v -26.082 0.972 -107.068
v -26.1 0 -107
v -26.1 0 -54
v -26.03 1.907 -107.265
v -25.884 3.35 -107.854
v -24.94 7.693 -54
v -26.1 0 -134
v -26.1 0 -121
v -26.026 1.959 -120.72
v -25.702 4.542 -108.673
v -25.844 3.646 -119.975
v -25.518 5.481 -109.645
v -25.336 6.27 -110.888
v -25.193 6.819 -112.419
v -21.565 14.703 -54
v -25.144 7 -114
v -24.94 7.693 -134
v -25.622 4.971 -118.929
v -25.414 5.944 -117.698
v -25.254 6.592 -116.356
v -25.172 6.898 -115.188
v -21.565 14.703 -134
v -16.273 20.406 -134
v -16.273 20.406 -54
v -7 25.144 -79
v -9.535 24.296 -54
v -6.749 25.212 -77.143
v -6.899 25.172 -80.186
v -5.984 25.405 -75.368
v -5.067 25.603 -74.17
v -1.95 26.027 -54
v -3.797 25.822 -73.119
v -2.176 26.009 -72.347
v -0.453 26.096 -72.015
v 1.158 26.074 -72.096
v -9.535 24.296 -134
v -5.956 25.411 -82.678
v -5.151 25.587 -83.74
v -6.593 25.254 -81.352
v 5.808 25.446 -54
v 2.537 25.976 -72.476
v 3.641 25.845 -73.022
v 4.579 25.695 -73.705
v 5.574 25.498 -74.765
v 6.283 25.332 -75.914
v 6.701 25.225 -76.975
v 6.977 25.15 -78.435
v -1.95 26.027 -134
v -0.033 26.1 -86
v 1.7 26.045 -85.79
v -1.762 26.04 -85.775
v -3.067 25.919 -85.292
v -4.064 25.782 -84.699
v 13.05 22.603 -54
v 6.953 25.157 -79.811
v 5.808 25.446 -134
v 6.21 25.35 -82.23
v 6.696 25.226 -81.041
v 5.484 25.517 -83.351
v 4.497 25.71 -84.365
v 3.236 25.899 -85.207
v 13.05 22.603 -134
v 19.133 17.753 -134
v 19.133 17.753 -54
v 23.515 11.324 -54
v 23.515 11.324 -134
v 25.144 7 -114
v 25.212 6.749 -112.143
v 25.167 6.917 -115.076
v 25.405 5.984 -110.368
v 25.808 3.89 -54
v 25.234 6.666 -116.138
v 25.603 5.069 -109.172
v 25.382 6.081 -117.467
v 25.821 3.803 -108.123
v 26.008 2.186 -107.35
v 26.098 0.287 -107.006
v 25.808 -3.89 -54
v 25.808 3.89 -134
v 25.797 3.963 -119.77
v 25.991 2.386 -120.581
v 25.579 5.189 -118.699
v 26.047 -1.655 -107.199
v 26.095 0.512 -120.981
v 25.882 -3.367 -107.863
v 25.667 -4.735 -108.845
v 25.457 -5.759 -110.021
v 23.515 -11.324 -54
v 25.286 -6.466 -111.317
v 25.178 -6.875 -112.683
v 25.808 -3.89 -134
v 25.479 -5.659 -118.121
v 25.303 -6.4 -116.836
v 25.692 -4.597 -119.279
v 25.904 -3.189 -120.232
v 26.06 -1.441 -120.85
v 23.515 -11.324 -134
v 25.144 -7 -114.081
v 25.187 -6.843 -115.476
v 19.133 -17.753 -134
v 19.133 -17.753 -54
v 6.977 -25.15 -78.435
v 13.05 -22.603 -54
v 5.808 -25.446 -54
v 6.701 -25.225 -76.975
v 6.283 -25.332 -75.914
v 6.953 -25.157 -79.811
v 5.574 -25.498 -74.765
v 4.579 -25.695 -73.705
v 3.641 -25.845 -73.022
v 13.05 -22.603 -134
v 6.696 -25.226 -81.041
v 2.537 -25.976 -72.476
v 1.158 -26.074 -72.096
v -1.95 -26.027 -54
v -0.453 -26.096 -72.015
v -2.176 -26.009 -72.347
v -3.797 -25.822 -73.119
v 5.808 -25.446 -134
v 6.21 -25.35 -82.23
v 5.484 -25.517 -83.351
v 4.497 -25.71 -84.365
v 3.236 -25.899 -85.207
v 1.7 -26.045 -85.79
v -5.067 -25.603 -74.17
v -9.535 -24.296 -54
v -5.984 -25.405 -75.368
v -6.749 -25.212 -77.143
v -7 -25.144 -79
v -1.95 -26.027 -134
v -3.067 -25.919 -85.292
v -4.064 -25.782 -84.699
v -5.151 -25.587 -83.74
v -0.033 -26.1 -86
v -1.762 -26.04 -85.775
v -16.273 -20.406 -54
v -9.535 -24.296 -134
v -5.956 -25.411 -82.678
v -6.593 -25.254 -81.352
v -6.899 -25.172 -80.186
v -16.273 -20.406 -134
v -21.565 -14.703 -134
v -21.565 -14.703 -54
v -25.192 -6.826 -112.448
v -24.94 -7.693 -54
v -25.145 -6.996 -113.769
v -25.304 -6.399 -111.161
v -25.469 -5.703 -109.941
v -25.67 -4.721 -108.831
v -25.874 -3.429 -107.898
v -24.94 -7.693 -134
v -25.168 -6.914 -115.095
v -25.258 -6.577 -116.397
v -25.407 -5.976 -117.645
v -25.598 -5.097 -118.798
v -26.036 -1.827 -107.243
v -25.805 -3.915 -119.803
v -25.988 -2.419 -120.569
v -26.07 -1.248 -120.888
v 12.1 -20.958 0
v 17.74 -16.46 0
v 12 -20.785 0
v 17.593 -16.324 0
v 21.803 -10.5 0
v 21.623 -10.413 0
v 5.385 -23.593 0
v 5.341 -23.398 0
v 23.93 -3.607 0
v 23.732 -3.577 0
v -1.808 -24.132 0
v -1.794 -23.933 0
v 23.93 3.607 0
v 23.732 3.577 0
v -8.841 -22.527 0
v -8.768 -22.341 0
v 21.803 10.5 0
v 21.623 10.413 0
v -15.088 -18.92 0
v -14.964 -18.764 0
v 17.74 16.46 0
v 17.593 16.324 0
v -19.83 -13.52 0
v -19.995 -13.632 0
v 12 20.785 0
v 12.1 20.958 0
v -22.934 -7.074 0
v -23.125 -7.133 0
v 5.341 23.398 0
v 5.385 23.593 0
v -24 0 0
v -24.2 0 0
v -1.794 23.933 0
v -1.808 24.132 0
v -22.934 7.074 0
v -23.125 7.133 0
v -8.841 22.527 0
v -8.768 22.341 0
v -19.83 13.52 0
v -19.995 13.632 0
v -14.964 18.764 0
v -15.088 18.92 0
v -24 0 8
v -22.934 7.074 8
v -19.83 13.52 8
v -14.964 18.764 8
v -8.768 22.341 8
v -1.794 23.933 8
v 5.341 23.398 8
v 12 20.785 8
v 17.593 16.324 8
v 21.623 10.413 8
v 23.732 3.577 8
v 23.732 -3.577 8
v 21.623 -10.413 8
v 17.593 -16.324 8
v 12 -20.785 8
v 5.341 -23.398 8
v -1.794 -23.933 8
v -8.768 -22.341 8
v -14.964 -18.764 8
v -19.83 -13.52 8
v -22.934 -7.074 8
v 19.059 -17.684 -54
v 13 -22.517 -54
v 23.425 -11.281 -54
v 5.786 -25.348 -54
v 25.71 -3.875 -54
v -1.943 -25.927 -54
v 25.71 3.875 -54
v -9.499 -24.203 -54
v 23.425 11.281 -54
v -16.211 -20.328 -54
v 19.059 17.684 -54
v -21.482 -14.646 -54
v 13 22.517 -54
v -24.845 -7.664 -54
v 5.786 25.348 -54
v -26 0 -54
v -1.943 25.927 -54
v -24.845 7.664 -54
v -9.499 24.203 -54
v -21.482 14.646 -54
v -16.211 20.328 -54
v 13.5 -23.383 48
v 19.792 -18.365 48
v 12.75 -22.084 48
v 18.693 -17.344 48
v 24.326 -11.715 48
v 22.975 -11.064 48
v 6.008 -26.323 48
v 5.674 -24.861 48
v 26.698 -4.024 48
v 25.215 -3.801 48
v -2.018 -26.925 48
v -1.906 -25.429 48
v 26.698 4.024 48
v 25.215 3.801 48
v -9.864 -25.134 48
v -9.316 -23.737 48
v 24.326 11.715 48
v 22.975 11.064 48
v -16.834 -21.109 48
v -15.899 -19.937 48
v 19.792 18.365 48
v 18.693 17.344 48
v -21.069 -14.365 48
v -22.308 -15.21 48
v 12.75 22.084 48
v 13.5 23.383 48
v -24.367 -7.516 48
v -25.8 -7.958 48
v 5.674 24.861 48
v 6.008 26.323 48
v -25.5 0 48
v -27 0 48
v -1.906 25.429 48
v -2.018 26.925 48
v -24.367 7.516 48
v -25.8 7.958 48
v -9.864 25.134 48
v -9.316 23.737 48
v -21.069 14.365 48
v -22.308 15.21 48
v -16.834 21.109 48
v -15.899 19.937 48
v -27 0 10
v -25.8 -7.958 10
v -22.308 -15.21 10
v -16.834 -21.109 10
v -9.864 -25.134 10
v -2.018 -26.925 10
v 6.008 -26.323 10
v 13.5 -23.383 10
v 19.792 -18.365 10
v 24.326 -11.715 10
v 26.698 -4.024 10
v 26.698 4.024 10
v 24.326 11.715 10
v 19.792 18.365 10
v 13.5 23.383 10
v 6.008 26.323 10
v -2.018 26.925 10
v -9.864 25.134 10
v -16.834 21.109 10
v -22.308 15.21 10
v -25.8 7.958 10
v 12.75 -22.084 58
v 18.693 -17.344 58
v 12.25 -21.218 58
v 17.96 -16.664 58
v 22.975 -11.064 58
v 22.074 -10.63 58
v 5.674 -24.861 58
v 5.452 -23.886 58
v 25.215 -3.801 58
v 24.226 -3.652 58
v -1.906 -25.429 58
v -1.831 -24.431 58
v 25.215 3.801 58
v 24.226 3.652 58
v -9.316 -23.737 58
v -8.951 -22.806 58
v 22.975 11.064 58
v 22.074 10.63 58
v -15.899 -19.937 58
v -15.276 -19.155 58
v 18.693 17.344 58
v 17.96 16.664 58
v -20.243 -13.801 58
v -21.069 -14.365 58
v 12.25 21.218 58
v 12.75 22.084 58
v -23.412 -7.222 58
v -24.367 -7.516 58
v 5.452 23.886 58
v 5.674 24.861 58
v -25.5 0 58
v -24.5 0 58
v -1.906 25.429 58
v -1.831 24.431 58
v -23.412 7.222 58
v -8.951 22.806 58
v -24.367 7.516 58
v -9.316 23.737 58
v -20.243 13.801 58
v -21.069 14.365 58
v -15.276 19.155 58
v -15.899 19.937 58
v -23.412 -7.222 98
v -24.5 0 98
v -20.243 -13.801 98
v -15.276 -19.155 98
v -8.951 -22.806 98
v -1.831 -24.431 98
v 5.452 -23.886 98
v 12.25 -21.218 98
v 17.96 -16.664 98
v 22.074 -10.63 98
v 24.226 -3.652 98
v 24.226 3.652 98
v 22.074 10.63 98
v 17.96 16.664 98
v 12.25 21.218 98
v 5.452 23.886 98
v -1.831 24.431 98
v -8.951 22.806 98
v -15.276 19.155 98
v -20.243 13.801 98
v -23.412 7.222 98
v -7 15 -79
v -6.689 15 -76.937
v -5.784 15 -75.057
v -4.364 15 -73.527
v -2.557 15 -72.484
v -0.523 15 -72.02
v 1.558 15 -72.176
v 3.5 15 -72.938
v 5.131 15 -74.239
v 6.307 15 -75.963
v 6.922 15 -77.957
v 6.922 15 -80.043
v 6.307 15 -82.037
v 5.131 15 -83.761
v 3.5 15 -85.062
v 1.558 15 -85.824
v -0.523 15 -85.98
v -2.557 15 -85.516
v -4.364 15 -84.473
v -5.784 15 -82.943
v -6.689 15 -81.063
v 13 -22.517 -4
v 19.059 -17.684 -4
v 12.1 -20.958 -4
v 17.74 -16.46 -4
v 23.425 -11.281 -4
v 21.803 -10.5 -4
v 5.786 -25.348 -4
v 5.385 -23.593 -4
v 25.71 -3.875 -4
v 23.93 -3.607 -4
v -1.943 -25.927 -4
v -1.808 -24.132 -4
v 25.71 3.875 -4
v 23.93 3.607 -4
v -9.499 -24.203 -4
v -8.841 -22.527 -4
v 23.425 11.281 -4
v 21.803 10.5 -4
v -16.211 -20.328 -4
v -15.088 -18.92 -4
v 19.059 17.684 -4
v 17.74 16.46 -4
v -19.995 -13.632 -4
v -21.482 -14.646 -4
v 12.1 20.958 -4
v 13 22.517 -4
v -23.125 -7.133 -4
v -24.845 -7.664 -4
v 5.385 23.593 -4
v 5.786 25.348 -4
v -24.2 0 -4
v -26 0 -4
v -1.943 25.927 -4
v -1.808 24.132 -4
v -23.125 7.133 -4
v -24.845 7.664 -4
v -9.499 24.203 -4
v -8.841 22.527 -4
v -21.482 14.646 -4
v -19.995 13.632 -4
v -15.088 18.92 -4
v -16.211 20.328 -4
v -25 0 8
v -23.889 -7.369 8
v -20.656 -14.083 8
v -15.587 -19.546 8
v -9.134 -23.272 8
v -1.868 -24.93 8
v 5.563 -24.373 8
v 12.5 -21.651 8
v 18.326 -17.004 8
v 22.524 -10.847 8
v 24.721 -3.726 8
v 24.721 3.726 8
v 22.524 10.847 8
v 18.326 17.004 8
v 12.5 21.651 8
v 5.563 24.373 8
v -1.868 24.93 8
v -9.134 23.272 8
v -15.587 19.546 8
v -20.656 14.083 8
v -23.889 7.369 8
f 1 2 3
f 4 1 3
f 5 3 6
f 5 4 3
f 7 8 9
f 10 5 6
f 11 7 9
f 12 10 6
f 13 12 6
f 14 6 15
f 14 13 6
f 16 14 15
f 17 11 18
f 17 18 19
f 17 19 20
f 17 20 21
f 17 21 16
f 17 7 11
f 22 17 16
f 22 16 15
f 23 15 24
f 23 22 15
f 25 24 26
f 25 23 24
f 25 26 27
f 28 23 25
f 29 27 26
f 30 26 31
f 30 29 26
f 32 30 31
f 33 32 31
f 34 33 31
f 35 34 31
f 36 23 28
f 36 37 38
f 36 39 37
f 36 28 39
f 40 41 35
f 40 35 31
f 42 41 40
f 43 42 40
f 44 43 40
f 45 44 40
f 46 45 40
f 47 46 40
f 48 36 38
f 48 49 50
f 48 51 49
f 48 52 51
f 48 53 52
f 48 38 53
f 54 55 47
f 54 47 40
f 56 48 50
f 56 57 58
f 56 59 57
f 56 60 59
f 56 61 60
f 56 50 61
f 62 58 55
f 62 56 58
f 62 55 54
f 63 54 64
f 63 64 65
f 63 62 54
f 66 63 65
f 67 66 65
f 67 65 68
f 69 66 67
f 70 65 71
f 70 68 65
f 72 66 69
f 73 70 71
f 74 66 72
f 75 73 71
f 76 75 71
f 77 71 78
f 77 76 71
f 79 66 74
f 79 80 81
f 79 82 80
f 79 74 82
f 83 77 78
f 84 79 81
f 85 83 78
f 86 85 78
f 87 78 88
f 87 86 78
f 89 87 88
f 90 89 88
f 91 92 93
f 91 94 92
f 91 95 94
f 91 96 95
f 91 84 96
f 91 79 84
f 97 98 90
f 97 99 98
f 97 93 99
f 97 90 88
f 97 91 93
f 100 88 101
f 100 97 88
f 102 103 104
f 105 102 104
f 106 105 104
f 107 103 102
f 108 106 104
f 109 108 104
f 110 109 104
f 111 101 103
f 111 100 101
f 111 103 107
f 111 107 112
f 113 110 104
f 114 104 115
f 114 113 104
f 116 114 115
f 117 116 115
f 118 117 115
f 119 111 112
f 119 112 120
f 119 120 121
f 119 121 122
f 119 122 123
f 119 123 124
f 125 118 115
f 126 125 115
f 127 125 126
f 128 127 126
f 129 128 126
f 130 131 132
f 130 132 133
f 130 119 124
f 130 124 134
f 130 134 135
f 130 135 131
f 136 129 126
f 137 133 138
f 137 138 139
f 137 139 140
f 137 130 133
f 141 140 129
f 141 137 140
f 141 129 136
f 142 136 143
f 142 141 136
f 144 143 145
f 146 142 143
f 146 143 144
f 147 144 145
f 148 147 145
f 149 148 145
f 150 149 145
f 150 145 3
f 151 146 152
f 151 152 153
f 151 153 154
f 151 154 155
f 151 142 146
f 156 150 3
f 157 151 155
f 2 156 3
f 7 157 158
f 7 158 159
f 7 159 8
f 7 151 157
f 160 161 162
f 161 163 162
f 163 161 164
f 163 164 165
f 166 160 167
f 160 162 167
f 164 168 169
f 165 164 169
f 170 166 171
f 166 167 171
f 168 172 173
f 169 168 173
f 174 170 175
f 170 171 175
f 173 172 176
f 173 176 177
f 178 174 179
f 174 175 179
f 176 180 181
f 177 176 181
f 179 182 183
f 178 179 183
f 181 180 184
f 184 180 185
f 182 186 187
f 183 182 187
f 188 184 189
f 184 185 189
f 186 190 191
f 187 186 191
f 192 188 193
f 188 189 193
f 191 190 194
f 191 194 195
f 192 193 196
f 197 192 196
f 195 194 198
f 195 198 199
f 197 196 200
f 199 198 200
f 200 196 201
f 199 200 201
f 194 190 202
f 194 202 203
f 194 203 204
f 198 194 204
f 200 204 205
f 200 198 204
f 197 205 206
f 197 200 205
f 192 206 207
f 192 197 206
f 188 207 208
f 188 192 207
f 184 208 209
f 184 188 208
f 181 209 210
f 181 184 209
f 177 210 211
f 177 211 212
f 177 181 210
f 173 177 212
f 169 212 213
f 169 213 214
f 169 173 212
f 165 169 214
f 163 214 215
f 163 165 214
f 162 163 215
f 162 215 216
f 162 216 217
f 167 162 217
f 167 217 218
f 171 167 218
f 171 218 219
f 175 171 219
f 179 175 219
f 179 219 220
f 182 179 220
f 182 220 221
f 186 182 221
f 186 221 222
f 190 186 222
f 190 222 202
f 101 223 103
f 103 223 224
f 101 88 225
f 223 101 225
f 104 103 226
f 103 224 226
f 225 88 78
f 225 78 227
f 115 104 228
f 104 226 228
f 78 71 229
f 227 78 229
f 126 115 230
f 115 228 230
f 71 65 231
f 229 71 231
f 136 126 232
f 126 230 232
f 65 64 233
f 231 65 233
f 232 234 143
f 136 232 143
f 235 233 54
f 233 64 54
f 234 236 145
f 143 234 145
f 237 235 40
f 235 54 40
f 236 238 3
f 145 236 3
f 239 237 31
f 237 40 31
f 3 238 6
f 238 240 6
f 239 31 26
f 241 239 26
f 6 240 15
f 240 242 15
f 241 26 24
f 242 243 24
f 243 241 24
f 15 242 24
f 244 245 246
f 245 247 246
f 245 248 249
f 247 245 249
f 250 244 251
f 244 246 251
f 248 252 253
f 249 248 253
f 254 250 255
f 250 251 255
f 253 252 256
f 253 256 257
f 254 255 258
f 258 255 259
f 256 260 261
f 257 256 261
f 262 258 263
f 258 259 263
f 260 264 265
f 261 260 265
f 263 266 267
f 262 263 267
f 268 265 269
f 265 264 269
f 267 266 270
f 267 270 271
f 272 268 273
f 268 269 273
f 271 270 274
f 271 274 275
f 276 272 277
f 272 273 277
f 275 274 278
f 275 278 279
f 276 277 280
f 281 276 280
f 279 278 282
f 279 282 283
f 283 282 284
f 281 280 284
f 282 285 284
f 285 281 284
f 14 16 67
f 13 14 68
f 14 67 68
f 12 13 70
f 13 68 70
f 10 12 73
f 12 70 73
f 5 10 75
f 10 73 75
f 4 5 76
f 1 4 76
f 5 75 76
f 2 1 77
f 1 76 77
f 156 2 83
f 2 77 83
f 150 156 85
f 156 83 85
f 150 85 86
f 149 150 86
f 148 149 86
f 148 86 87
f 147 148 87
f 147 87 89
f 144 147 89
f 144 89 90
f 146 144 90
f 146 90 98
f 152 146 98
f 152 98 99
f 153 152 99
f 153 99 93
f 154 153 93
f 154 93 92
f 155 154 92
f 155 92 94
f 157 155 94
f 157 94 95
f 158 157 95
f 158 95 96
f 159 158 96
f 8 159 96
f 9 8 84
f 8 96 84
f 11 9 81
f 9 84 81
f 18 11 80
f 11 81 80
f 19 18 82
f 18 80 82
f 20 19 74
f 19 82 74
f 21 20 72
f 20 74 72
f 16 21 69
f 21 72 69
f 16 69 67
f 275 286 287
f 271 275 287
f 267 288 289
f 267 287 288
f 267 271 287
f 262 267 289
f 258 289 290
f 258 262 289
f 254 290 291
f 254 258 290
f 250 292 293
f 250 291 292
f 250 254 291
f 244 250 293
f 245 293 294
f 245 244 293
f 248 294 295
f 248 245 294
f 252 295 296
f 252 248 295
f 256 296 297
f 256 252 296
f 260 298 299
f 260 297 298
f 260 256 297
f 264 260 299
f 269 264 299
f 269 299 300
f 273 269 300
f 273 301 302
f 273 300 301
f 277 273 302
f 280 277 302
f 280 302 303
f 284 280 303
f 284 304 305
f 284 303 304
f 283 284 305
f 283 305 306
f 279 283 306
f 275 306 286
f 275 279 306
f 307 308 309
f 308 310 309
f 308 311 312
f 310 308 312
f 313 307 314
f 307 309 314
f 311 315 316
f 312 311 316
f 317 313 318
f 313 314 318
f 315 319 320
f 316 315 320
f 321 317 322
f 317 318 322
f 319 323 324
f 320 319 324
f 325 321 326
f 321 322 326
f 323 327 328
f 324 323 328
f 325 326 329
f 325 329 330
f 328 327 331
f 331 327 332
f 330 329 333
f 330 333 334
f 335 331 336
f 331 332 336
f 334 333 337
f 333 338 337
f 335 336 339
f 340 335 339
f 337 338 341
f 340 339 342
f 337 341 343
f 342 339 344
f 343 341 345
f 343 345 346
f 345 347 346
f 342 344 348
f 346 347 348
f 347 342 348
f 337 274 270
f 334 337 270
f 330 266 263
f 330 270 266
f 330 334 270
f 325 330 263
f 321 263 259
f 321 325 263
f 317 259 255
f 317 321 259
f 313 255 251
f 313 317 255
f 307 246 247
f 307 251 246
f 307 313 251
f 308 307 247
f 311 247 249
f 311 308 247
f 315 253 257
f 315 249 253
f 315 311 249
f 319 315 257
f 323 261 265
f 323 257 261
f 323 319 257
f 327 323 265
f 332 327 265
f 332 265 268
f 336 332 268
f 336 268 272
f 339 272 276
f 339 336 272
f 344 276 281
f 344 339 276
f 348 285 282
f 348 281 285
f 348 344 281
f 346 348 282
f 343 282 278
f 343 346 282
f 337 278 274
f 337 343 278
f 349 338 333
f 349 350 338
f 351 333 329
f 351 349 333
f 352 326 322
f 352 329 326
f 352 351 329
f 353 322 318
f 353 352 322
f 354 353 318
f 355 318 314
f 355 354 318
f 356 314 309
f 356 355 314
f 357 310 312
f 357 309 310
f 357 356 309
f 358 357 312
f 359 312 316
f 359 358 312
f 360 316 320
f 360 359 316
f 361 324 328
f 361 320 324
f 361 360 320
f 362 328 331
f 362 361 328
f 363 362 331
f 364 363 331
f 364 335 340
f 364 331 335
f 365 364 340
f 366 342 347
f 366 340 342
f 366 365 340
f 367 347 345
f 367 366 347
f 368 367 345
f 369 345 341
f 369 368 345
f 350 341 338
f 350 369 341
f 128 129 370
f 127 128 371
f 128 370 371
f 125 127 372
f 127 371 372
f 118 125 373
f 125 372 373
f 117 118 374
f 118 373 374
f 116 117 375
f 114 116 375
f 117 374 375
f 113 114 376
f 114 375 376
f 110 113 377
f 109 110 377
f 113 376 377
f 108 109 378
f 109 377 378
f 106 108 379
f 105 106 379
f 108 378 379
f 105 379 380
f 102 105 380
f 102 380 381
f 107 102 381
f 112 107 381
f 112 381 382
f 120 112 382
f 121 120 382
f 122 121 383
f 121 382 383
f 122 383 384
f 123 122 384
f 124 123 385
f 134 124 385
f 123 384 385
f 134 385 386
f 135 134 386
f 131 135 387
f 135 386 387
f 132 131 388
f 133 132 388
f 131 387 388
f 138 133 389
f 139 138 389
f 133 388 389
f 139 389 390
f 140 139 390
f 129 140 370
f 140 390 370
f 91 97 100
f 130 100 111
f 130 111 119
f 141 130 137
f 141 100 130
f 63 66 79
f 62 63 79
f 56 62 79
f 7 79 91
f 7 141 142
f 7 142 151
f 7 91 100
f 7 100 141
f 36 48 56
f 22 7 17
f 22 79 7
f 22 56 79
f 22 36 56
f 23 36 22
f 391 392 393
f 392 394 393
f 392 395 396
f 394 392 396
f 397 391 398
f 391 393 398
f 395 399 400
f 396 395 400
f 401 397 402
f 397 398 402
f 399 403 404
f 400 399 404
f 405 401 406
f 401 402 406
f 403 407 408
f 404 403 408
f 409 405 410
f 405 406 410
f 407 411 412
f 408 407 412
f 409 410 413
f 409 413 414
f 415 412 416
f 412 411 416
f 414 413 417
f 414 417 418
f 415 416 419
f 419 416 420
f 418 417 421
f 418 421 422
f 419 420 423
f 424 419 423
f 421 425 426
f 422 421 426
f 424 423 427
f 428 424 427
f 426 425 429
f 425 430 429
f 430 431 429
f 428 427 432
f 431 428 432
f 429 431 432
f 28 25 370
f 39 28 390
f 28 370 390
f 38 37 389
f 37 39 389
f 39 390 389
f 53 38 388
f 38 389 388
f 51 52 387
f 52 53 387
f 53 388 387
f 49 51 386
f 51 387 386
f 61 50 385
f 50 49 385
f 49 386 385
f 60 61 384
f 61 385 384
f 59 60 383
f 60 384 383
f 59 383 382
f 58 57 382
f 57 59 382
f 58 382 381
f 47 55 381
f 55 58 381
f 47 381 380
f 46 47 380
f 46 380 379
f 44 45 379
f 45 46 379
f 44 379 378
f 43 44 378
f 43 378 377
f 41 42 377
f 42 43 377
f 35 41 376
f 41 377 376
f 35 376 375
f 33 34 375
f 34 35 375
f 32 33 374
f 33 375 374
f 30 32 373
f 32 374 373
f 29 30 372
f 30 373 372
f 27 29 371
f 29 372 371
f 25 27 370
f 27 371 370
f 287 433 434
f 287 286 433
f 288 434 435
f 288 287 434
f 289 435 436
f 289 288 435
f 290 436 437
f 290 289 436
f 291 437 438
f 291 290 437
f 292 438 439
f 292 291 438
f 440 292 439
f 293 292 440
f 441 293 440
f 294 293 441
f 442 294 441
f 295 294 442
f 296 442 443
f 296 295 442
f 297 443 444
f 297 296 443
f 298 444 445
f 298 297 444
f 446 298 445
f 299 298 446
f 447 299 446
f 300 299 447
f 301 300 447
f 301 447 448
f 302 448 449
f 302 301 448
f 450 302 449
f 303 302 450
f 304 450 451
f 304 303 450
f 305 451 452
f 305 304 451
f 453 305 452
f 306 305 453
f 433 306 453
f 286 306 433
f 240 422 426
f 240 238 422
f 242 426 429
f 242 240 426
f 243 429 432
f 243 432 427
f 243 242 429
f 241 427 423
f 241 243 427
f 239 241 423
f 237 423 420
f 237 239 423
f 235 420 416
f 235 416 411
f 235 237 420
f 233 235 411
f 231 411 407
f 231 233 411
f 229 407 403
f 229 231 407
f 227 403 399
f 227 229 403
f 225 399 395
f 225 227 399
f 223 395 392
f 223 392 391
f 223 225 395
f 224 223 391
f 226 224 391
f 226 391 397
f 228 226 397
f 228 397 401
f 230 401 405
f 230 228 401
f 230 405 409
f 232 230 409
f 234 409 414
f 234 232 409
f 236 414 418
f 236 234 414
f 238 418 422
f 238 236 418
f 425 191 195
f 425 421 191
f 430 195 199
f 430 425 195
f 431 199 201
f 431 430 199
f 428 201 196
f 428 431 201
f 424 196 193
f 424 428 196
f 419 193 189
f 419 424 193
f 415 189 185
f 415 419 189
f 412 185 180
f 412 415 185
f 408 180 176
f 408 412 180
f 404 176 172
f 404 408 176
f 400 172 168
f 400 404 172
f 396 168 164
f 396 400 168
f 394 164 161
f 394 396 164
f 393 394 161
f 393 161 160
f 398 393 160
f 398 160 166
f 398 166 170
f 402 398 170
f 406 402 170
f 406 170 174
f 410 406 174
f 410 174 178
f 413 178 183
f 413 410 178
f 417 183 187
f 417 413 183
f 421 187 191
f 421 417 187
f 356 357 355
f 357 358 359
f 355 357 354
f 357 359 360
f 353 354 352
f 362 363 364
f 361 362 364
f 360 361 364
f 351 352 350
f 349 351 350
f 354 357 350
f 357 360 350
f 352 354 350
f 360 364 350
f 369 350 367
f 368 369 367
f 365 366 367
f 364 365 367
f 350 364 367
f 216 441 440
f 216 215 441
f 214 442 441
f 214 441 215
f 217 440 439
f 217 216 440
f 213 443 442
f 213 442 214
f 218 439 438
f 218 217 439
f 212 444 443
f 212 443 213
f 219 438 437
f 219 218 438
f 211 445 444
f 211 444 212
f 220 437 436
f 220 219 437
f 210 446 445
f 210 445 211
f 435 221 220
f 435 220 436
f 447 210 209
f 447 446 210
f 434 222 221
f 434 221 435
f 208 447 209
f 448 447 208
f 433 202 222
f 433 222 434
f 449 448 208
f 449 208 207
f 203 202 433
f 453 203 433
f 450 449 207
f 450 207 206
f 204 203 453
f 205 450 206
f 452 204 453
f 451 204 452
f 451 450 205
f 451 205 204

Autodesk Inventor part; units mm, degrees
ref_plane "YZ Plane" through (0, 0, 0) normal (1, 0, 0) x (0, 1, 0)
ref_plane "XY Plane" through (0, 0, 0) normal (0, 0, 1) x (1, 0, 0)
sketch "Sketch1" plane through (0, 0, 0) normal (0, 1, 0) x (-1, 0, 0)
  line L0 (24, 8) -> (27, 8)
  line L1 (27, 8) -> (27, 48)
  line L2 (27, 48) -> (25.5, 48)
  line L3 (25.5, 48) -> (25.5, 58)
  line L4 (26, 208) -> (25, 208)
  line L5 (25, 248) -> (25, 248)
  line L6 (0, 138) -> (0, -122.7414) construction
  line L7 (24, 8) -> (24, 0)
  line L8 (0, 98) -> (0, 0)
  line L9 (24, 0) -> (24.2, 0)
  line L10 (24.2, 0) -> (24.2, -4)
  line L11 (24.2, -4) -> (26, -4)
  line L12 (26, -4) -> (26, -54)
  line L13 (26, -54) -> (26.1, -54)
  line L14 (26.1, -54) -> (26.1, -134)
  line L15 (26.1, -134) -> (0, -134)
  line L16 (0, 0) -> (0, -134)
  line L17 (24, 0) -> (24.2, 0)
  line L18 (25.5, 58) -> (24.5, 58)
  line L19 (24.5, 58) -> (24.5, 98)
  line L20 (24.5, 98) -> (0, 98)
  dimension "d2" = 40
  dimension "d4" = 8
  dimension "d16" = 10
  dimension "d71" = 27
  dimension "d78" = 24
  dimension "d82" = 4
  dimension "d83" = 50
  dimension "d84" = 24.2
  dimension "d85" = 26.1
  dimension "d86" = 80
  dimension "d88" = 25.5
  dimension "d89" = 26
  dimension "d90" = 40
  dimension "d92" = 24.5
ref_plane "Work Plane1" through (0, 15, 0) normal (0, 1, 0) x (-1, 0, 0)
sketch "Sketch3" plane through (0, 15, 0) normal (0, 1, 0) x (-1, 0, 0)
  circle A0 centre (0, -79) radius 7
  point P0 (0, 0)
  dimension "d22" = 14
  dimension "d66" = 79
sketch "Sketch4" plane through (0, 0, 0) normal (1, 0, 0) x (0, 1, 0)
  circle A0 centre (0, -114) radius 7
  point P0 (0, 0)
  dimension "d28" = 14
  dimension "d67" = 114
revolve "Revolution1" add sketch "Sketch1" angle 360 about axis through (0, 0, 98) along (0, 0, -1)
extrude "Extrusion5" cut sketch "Sketch3" along normal blind 20 and the other way blind 45
extrude "Extrusion6" cut sketch "Sketch4" along normal blind 35 and the other way blind 30
chamfer "Chamfer3" distance 2 angle 45 1 edges at (27, 0, 8)
sketch "Sketch5" plane through (0, 0, 0) normal (0, 1, 0) x (-1, 0, 0)
  line L0 (24, 8) -> (24, 0) projected
  point P0 (0, 0)
sketch "Sketch6" plane through (0, 0, 0) normal (1, 0, 0) x (0, 1, 0)
  line L0 (0, 0) -> (-46.2751, 0) construction
equation "\"DiametroInterior\" = 52.2"
properties part number "Mangon_Conducido"
